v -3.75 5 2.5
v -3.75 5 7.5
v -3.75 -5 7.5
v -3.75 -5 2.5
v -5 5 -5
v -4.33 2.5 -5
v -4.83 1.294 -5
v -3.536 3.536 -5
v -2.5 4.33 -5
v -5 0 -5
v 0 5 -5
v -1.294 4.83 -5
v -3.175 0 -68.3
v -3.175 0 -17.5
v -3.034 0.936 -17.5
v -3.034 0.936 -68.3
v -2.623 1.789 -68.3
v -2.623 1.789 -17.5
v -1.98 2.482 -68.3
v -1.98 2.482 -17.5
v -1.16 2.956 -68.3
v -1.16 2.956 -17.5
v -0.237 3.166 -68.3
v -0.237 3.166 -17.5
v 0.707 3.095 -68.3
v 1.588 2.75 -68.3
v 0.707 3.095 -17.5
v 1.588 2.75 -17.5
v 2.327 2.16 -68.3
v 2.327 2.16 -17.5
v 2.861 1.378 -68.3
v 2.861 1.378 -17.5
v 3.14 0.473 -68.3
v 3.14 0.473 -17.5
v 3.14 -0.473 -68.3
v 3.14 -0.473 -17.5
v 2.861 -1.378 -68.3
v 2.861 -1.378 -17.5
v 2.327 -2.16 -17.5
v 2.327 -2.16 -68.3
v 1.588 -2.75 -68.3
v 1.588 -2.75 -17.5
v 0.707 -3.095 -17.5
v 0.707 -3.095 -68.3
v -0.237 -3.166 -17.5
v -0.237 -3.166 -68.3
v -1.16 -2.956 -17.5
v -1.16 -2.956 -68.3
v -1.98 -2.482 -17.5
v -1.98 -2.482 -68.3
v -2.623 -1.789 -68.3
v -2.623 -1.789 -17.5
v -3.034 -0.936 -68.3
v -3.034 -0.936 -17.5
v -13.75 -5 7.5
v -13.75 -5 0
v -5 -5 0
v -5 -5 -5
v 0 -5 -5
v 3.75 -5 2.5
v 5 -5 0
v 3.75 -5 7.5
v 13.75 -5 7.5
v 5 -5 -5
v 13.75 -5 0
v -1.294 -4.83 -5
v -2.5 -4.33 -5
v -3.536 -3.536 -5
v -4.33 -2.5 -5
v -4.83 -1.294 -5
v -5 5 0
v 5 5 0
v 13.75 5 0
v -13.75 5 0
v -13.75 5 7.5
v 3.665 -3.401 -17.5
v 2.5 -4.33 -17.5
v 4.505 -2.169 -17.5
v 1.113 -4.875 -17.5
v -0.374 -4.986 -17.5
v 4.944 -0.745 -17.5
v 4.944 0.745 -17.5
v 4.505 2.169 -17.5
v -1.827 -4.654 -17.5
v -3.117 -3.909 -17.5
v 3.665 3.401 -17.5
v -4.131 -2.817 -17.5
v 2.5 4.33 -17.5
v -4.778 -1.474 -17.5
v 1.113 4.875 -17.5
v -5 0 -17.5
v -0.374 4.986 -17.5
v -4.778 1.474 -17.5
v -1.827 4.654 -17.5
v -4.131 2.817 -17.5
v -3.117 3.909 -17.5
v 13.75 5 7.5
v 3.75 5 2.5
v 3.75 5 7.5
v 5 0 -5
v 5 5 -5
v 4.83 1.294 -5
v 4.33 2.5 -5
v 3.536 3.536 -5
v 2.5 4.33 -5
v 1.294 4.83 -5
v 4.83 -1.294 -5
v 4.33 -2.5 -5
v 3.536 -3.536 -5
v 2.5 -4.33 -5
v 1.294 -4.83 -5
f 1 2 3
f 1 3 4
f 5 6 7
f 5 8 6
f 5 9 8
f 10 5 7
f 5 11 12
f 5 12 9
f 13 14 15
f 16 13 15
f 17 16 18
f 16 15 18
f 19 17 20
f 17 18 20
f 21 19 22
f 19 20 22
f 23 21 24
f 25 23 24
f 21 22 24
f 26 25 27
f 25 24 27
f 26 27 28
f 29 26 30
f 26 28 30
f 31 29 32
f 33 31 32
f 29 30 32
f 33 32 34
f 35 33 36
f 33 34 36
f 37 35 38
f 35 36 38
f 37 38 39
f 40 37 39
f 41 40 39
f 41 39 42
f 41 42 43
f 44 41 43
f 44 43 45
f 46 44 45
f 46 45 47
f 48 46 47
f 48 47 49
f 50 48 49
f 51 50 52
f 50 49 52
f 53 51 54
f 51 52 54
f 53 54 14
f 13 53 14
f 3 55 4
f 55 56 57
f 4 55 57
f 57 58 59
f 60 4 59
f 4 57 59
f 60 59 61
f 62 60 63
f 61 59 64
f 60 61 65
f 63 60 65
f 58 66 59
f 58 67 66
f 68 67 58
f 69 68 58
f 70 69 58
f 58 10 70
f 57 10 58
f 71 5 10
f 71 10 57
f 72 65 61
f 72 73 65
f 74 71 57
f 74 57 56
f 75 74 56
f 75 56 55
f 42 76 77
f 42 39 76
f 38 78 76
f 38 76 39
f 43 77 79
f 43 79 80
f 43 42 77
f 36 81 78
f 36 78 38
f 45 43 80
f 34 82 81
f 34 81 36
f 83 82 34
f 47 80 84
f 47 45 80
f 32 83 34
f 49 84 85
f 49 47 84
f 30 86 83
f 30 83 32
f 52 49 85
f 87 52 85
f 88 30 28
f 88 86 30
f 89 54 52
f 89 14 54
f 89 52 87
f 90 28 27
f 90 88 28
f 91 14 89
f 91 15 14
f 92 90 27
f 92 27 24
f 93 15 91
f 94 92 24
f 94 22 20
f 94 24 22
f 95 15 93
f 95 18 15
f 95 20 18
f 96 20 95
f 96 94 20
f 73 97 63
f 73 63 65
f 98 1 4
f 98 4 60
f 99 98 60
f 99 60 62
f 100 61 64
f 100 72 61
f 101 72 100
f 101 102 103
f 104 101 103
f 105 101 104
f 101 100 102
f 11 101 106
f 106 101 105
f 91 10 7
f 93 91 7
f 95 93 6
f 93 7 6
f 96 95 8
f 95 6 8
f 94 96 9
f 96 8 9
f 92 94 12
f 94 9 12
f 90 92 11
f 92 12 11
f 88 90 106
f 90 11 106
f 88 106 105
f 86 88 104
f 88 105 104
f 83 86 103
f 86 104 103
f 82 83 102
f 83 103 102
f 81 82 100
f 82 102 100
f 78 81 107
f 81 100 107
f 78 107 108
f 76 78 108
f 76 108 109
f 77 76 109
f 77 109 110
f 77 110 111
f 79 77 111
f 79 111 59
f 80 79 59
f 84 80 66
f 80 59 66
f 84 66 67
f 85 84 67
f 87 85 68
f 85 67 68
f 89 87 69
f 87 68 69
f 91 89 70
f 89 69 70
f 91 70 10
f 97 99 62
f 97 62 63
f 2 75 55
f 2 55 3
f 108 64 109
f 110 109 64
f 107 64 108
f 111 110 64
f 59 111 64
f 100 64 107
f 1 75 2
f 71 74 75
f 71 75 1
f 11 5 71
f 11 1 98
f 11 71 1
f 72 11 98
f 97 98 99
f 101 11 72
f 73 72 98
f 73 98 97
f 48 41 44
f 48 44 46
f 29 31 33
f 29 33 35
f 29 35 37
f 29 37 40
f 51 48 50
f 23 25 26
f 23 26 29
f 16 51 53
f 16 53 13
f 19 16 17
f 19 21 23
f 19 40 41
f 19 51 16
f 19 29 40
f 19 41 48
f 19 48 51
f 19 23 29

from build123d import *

# Parameters (mm, degrees)
BOSS_EXTRUDE1_DEPTH = 5
SKETCH2_R           = 5
BOSS_EXTRUDE2_DEPTH = 12.5
SKETCH3_R           = 3.175
BOSS_EXTRUDE3_DEPTH = 50.8


with BuildPart() as part:
    # Sketch1 → Boss-Extrude1 (new, symmetric)
    with BuildSketch(Plane(origin=(0, 0, 0), x_dir=(1, 0, 0), z_dir=(0, 1, 0))):
        Polygon((5, 5), (-5, 5), (-5, 0), (-13.75, 0), (-13.75, -7.5), (-3.75, -7.5), (-3.75, -2.5), (3.75, -2.5), (3.75, -7.5), (13.75, -7.5), (13.75, 0), (5, 0), align=None)
    extrude(amount=BOSS_EXTRUDE1_DEPTH, both=True)

    # Sketch2 → Boss-Extrude2 (add)
    with BuildSketch(Plane(origin=(0, 0, -5), x_dir=(-1, 0, 0), z_dir=(0, 0, -1))):
        Circle(SKETCH2_R)
    extrude(amount=BOSS_EXTRUDE2_DEPTH)

    # Sketch3 → Boss-Extrude3 (add)
    with BuildSketch(Plane(origin=(0, 0, -17.5), x_dir=(-1, 0, 0), z_dir=(0, 0, -1))):
        Circle(SKETCH3_R)
    extrude(amount=BOSS_EXTRUDE3_DEPTH)


solid = part.part
